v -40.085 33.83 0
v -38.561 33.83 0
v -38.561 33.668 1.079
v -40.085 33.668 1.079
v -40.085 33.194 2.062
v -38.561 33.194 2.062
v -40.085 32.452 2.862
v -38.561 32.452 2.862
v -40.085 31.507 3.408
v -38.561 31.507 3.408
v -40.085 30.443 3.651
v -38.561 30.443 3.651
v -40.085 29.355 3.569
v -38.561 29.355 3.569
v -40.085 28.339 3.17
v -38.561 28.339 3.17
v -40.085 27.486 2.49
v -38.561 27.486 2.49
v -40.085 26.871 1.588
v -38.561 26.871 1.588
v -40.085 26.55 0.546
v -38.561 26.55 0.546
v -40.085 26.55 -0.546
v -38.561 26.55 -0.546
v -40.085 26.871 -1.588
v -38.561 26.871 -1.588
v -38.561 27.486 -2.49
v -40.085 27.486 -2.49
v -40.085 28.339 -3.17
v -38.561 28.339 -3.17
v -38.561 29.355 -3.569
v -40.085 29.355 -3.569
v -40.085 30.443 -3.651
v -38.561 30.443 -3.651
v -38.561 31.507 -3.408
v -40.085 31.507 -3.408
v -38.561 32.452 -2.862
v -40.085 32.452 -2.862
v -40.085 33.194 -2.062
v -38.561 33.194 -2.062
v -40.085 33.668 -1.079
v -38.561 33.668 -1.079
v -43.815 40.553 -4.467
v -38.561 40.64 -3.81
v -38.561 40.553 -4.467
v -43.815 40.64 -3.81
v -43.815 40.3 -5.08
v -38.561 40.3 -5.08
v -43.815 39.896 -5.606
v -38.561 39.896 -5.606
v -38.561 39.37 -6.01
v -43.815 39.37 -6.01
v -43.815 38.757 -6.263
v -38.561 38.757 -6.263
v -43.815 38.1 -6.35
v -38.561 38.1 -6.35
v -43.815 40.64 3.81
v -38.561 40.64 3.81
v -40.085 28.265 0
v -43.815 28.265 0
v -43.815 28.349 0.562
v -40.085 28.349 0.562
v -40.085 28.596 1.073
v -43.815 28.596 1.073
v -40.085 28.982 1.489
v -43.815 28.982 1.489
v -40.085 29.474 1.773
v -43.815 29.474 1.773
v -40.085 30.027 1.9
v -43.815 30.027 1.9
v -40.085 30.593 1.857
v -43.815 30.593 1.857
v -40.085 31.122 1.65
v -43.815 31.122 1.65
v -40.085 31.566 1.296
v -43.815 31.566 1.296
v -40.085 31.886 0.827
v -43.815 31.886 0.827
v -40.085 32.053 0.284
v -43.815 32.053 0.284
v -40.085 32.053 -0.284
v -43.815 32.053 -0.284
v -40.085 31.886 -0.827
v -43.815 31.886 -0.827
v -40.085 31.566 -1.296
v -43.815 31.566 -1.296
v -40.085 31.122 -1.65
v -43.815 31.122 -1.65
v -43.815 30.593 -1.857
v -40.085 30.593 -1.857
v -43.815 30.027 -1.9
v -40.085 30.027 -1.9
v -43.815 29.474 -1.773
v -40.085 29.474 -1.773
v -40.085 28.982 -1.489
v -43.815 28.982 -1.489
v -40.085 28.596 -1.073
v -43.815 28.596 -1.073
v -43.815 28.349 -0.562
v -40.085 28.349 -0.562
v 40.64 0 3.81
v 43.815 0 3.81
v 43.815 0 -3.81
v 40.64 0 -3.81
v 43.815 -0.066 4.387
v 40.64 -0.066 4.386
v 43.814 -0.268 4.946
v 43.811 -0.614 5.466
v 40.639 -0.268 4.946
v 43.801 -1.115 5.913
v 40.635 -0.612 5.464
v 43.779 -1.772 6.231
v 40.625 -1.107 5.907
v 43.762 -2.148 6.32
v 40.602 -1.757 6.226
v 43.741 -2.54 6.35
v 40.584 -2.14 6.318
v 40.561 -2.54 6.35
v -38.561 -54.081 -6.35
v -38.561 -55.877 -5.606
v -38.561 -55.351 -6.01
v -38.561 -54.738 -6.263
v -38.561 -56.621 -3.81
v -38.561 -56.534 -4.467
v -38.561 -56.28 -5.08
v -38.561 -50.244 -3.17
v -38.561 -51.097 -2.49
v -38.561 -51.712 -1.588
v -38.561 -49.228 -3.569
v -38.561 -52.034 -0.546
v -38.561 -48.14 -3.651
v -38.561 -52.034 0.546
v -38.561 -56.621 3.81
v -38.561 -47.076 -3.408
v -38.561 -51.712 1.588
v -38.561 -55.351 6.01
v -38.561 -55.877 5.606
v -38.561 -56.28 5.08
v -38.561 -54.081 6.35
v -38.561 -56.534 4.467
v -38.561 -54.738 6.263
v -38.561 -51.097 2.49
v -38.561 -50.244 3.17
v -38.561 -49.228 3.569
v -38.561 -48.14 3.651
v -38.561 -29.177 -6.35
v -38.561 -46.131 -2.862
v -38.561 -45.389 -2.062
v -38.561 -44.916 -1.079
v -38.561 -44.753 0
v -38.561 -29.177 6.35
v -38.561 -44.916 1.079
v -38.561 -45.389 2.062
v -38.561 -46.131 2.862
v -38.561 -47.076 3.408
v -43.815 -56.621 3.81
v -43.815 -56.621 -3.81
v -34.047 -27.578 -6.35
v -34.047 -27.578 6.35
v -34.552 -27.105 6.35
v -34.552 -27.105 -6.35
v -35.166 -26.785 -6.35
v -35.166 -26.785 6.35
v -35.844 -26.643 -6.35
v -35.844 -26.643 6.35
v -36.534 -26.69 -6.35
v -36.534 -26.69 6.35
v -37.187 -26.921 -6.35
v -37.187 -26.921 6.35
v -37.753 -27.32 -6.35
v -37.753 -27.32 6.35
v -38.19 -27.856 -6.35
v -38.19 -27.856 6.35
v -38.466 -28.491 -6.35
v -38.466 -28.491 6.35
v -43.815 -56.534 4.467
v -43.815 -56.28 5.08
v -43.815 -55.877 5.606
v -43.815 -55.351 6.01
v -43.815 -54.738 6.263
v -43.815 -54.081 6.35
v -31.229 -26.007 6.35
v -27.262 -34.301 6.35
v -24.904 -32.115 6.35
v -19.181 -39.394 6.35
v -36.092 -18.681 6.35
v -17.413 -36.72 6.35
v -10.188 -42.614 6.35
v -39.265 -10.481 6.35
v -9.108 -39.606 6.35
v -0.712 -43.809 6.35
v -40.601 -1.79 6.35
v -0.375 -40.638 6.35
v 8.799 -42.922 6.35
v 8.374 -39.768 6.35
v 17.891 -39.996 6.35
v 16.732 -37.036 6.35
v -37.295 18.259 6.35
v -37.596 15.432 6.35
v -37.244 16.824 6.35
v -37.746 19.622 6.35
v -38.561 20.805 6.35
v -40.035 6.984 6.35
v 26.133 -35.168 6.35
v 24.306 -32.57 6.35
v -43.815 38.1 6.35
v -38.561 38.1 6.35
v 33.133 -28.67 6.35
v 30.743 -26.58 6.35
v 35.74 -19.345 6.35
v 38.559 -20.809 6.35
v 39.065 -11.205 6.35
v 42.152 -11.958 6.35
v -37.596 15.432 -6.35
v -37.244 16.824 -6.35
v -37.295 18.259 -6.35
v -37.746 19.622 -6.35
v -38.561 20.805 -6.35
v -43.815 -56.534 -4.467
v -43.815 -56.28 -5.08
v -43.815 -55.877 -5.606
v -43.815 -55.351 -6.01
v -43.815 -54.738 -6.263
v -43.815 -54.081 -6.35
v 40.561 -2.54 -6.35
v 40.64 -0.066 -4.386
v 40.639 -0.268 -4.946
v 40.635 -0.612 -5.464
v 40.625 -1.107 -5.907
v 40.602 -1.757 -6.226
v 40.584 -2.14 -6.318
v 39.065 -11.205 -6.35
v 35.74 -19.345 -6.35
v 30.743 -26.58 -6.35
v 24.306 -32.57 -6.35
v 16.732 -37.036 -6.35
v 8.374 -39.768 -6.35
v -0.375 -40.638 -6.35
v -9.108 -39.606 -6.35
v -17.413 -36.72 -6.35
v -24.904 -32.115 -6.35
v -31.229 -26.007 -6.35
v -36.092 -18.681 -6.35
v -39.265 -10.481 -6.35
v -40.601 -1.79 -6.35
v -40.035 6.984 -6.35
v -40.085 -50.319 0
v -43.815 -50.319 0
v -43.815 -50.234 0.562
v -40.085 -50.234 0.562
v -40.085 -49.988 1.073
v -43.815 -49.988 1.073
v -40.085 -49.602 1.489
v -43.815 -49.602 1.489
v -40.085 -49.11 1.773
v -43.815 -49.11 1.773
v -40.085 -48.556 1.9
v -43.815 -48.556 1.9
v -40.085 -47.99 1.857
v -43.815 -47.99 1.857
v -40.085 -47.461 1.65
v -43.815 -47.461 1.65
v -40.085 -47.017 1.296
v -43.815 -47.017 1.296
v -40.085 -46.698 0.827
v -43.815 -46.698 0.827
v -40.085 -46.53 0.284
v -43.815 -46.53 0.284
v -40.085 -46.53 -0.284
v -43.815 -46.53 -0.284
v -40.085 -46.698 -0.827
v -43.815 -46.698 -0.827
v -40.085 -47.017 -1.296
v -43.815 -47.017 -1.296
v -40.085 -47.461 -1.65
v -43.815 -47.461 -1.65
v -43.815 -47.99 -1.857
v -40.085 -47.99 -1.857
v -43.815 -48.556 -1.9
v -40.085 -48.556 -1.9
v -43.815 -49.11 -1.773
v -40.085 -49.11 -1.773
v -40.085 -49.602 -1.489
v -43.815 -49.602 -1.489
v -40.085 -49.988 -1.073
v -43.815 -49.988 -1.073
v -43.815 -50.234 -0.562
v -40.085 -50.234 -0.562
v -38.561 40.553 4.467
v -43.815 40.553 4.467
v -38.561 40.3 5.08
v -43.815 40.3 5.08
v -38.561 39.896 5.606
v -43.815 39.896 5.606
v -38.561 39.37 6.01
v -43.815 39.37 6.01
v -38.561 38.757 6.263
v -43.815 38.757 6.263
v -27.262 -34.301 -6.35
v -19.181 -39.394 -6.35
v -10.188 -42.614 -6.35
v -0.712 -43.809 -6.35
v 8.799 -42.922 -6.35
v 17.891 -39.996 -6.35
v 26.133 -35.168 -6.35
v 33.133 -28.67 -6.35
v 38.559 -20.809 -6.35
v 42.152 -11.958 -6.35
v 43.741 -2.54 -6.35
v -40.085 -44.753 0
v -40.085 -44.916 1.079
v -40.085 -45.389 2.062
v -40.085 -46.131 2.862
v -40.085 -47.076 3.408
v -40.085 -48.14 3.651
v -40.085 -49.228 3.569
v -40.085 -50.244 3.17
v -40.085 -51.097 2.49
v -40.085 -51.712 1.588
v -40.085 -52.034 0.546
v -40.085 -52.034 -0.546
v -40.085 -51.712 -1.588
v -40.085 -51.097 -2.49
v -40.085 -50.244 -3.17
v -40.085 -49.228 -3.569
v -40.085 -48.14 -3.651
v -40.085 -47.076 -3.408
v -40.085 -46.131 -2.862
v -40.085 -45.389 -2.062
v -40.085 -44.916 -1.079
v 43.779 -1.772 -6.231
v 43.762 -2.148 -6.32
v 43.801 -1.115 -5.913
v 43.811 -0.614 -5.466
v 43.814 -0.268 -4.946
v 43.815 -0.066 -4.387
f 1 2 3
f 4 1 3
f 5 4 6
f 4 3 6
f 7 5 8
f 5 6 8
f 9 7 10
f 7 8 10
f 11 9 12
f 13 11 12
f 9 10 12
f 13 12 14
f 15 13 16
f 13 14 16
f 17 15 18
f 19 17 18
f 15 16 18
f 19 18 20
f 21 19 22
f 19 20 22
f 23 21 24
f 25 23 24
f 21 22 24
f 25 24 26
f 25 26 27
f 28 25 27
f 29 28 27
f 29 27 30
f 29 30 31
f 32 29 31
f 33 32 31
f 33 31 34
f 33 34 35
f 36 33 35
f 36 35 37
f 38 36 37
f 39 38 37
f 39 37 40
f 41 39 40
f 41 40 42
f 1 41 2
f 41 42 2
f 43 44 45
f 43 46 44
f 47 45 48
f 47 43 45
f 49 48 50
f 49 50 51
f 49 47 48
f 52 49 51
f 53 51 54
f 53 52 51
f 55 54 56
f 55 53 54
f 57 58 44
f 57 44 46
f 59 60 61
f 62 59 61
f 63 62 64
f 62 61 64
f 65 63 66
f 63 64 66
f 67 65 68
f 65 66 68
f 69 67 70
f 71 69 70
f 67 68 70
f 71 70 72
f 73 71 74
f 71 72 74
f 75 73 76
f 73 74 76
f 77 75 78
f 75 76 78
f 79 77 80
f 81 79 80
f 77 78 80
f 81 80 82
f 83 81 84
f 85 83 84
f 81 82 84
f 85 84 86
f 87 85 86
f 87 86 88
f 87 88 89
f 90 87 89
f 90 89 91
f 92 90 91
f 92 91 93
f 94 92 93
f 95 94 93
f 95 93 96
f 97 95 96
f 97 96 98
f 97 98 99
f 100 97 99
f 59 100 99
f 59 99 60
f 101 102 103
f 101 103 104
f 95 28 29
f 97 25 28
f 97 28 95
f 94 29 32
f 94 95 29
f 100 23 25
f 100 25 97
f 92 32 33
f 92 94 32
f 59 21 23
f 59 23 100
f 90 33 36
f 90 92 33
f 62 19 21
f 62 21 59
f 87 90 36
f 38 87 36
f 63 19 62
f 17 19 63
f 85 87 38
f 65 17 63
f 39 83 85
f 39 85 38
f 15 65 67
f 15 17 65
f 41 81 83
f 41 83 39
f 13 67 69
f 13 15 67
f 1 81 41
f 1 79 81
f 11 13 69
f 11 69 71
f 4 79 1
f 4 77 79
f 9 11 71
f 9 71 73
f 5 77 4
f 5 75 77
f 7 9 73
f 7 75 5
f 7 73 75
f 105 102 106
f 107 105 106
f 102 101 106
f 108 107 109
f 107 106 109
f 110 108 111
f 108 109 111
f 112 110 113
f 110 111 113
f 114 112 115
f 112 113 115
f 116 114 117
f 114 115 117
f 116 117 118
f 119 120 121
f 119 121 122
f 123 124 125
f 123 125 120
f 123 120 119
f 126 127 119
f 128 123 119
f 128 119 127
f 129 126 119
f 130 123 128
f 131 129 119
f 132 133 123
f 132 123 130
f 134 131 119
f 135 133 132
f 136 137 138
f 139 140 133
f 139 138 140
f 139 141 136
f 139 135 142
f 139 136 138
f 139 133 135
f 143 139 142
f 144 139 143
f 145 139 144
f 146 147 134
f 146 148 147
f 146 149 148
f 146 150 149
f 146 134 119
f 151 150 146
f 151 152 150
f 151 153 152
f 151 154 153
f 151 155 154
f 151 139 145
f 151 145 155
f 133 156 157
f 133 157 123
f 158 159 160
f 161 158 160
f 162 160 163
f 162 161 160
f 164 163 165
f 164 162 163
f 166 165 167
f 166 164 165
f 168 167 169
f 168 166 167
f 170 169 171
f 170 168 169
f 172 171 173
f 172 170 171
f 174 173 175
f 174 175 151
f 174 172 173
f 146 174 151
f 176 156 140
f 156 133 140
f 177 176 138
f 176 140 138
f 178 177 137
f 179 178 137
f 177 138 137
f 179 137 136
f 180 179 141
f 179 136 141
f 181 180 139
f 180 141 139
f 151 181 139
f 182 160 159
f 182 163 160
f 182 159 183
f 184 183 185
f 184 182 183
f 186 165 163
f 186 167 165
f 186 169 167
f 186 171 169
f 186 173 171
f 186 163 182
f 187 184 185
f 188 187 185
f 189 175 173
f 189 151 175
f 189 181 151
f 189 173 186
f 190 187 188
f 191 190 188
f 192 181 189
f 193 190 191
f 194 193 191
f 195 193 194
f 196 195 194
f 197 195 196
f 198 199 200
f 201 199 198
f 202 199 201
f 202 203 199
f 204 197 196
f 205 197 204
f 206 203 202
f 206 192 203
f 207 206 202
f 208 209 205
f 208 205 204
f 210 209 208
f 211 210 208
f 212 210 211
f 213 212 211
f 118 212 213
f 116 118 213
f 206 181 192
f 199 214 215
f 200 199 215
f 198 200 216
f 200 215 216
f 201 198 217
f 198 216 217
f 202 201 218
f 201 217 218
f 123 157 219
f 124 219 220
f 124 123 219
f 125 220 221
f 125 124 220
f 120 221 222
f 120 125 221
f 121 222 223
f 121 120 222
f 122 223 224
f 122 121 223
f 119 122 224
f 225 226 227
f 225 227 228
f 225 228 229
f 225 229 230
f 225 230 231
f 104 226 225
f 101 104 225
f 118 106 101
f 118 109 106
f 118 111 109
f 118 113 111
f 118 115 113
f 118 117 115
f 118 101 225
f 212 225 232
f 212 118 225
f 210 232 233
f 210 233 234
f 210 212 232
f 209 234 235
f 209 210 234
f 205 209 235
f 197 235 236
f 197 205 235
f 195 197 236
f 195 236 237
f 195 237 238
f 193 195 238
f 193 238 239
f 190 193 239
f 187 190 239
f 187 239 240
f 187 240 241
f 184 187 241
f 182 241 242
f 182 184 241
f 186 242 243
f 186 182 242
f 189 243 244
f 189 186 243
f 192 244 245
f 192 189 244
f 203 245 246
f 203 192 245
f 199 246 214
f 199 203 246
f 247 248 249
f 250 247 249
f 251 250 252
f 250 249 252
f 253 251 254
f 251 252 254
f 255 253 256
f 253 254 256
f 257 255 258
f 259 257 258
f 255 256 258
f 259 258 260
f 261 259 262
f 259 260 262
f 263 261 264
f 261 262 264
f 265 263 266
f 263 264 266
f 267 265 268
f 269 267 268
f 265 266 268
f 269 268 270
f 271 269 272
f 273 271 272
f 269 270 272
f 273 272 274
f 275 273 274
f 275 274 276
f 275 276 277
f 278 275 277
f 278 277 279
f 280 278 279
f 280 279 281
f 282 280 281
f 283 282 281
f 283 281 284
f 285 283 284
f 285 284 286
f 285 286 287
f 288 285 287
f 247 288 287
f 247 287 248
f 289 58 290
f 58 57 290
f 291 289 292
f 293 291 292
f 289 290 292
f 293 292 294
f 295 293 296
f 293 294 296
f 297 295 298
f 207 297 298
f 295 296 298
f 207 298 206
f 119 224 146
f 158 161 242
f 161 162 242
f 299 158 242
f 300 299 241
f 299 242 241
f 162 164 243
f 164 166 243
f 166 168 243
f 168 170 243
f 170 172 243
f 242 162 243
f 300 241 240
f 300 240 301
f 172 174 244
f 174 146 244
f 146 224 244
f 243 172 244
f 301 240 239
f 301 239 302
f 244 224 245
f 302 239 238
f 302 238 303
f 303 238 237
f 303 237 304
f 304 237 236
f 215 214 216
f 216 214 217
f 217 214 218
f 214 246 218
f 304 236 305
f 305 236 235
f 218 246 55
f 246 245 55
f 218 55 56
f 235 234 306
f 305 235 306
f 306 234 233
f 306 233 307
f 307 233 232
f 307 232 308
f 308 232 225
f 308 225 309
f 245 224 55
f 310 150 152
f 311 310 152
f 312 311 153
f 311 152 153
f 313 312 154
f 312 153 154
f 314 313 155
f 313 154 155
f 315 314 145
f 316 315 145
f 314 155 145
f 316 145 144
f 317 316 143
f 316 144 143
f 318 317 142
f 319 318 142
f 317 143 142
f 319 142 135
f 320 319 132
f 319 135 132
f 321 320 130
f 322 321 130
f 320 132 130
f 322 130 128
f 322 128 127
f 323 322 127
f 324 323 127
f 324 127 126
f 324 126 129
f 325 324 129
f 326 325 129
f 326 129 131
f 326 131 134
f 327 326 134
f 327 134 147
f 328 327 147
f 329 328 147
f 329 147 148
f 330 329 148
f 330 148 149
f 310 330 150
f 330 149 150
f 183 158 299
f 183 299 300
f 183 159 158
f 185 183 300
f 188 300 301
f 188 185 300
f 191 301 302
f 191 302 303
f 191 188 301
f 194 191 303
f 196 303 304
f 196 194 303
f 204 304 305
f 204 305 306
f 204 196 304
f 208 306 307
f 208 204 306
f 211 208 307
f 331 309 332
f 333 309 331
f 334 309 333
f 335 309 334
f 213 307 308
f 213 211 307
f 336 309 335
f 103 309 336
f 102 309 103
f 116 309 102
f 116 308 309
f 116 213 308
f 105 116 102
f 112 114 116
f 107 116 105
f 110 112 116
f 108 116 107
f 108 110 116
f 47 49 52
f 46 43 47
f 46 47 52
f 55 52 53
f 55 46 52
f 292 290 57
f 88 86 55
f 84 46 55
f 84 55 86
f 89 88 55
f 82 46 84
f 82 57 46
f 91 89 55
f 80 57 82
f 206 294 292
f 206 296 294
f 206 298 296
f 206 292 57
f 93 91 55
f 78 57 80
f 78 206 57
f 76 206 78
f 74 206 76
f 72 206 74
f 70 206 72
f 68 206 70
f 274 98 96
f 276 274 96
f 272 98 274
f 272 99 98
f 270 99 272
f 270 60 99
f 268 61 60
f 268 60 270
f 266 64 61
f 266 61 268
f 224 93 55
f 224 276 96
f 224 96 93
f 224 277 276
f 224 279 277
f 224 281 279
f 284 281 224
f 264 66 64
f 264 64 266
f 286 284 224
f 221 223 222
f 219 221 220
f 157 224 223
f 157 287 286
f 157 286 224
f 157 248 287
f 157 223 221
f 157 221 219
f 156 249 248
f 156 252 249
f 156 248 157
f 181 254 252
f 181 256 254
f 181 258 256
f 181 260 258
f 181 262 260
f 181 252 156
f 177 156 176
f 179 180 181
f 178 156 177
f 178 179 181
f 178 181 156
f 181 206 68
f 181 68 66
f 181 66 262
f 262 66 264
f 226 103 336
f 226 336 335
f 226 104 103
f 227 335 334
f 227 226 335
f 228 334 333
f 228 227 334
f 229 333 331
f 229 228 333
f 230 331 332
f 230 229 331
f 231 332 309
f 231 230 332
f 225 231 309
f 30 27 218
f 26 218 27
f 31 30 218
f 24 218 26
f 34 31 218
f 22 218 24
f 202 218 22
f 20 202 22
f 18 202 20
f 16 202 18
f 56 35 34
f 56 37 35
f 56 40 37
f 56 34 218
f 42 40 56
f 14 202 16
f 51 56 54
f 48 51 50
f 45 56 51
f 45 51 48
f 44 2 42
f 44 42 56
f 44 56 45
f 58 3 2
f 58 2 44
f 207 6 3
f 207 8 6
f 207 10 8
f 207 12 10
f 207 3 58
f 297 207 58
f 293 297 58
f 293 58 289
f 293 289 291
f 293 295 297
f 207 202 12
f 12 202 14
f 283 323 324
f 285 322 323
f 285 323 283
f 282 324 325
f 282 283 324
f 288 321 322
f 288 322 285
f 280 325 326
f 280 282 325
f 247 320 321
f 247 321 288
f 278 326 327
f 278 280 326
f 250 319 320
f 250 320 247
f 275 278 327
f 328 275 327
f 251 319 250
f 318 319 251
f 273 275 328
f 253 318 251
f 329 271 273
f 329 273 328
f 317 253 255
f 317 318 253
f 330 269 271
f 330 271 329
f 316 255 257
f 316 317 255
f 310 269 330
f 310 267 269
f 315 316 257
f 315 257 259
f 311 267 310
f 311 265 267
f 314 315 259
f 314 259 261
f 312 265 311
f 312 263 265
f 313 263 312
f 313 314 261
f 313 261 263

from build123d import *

# Parameters (mm, degrees)
F1_DEPTH    = 6.35
F2_R        = 2.54
F3_R        = 1.905
F4_DEPTH    = 25.4
F5_R        = 3.6608290009
F6_DEPTH    = 1.524
F7_T1_DEPTH = 34.0803226462


# Not quite as in the source:
# - a fillet or chamfer that OpenCascade refuses, or shapes differently, is made with other operations: its cross-section is extruded or revolved along the edge and cut away or added
# - a feature names something its author has since deleted; it is built from what else it names


with BuildPart() as f1:
    # F0 (on Top) → F1 (new body, symmetric)
    with BuildSketch(Plane.XY):
        with BuildLine():
            ThreePointArc((40.64, 0), (-9.9515149654, -39.402753075), (-35.7663459593, 19.2971007335))
            Line((-35.7663459593, 19.2971007335), (-38.5605917374, 20.8046867283))
            Line((-38.5605917374, 20.8046867283), (-38.5605917374, 40.64))
            Line((-38.5605917374, 40.64), (-43.815, 40.64))
            Line((-43.815, 40.64), (-43.815, -43.815))
            Line((-43.815, -43.815), (-43.815, -56.6207952306))
            Line((-43.815, -56.6207952306), (-38.5605917374, -56.6207952306))
            Line((-38.5605917374, -56.6207952306), (-38.5605917374, -43.815))
            Line((-38.5605917374, -43.815), (-38.5605917374, -20.8046867283))
            ThreePointArc((-38.5605917374, -20.8046867283), (10.7289770721, -42.481093159), (43.815, 0))
            Line((43.815, 0), (40.64, 0))
        make_face()
    extrude(amount=F1_DEPTH, both=True)

    # F2
    f2_edges = [f1.edges().sort_by_distance(p)[0] for p in [
        (42.2275, 0, 6.35),
        (42.2275, 0, -6.35),
        (-38.560592, -20.804687, 0),
        (-41.187796, 40.64, 6.35),
        (-41.187796, 40.64, -6.35),
        (-41.187796, -56.620795, 6.35),
        (-41.187796, -56.620795, -6.35),
    ]]
    fillet(f2_edges, radius=F2_R)

    # F3 (on face) → F4 (cut)
    with BuildSketch(Plane(origin=(-43.815, 0, 0), x_dir=(0, -1, 0), z_dir=(-1, 0, 0))):
        with Locations((-30.1695157966, 0)):
            Circle(F3_R)
        with Locations((48.4138801694, 0)):
            Circle(F3_R)
    extrude(amount=-F4_DEPTH, mode=Mode.SUBTRACT)

    # F5 (on face) → F6 (cut)
    with BuildSketch(Plane.YZ.offset(-38.5605917374)):
        with Locations((30.1695157966, 0)):
            Circle(F5_R)
        with Locations((-48.4138801694, 0)):
            Circle(F5_R)
    extrude(amount=-F6_DEPTH, mode=Mode.SUBTRACT)

    # F7: fillet of radius 5.08 on 1 edges, made by hand

    # F7_s2 → F7_t1 (cut)
    with BuildSketch(Plane.XY.offset(-17.0401613231)):
        with BuildLine():
            ThreePointArc((-37.5959569593, 15.4322266804), (-37.2954100255, 18.259021389), (-38.5605917374, 20.8046867283))
            Line((-38.5605917374, 20.8046867283), (-35.7663459593, 19.2971007335))
            ThreePointArc((-35.7663459593, 19.2971007335), (-36.7320185294, 17.3887439097), (-37.5959569593, 15.4322266804))
        make_face()
    extrude(amount=F7_T1_DEPTH, mode=Mode.SUBTRACT)


solid = f1.part
